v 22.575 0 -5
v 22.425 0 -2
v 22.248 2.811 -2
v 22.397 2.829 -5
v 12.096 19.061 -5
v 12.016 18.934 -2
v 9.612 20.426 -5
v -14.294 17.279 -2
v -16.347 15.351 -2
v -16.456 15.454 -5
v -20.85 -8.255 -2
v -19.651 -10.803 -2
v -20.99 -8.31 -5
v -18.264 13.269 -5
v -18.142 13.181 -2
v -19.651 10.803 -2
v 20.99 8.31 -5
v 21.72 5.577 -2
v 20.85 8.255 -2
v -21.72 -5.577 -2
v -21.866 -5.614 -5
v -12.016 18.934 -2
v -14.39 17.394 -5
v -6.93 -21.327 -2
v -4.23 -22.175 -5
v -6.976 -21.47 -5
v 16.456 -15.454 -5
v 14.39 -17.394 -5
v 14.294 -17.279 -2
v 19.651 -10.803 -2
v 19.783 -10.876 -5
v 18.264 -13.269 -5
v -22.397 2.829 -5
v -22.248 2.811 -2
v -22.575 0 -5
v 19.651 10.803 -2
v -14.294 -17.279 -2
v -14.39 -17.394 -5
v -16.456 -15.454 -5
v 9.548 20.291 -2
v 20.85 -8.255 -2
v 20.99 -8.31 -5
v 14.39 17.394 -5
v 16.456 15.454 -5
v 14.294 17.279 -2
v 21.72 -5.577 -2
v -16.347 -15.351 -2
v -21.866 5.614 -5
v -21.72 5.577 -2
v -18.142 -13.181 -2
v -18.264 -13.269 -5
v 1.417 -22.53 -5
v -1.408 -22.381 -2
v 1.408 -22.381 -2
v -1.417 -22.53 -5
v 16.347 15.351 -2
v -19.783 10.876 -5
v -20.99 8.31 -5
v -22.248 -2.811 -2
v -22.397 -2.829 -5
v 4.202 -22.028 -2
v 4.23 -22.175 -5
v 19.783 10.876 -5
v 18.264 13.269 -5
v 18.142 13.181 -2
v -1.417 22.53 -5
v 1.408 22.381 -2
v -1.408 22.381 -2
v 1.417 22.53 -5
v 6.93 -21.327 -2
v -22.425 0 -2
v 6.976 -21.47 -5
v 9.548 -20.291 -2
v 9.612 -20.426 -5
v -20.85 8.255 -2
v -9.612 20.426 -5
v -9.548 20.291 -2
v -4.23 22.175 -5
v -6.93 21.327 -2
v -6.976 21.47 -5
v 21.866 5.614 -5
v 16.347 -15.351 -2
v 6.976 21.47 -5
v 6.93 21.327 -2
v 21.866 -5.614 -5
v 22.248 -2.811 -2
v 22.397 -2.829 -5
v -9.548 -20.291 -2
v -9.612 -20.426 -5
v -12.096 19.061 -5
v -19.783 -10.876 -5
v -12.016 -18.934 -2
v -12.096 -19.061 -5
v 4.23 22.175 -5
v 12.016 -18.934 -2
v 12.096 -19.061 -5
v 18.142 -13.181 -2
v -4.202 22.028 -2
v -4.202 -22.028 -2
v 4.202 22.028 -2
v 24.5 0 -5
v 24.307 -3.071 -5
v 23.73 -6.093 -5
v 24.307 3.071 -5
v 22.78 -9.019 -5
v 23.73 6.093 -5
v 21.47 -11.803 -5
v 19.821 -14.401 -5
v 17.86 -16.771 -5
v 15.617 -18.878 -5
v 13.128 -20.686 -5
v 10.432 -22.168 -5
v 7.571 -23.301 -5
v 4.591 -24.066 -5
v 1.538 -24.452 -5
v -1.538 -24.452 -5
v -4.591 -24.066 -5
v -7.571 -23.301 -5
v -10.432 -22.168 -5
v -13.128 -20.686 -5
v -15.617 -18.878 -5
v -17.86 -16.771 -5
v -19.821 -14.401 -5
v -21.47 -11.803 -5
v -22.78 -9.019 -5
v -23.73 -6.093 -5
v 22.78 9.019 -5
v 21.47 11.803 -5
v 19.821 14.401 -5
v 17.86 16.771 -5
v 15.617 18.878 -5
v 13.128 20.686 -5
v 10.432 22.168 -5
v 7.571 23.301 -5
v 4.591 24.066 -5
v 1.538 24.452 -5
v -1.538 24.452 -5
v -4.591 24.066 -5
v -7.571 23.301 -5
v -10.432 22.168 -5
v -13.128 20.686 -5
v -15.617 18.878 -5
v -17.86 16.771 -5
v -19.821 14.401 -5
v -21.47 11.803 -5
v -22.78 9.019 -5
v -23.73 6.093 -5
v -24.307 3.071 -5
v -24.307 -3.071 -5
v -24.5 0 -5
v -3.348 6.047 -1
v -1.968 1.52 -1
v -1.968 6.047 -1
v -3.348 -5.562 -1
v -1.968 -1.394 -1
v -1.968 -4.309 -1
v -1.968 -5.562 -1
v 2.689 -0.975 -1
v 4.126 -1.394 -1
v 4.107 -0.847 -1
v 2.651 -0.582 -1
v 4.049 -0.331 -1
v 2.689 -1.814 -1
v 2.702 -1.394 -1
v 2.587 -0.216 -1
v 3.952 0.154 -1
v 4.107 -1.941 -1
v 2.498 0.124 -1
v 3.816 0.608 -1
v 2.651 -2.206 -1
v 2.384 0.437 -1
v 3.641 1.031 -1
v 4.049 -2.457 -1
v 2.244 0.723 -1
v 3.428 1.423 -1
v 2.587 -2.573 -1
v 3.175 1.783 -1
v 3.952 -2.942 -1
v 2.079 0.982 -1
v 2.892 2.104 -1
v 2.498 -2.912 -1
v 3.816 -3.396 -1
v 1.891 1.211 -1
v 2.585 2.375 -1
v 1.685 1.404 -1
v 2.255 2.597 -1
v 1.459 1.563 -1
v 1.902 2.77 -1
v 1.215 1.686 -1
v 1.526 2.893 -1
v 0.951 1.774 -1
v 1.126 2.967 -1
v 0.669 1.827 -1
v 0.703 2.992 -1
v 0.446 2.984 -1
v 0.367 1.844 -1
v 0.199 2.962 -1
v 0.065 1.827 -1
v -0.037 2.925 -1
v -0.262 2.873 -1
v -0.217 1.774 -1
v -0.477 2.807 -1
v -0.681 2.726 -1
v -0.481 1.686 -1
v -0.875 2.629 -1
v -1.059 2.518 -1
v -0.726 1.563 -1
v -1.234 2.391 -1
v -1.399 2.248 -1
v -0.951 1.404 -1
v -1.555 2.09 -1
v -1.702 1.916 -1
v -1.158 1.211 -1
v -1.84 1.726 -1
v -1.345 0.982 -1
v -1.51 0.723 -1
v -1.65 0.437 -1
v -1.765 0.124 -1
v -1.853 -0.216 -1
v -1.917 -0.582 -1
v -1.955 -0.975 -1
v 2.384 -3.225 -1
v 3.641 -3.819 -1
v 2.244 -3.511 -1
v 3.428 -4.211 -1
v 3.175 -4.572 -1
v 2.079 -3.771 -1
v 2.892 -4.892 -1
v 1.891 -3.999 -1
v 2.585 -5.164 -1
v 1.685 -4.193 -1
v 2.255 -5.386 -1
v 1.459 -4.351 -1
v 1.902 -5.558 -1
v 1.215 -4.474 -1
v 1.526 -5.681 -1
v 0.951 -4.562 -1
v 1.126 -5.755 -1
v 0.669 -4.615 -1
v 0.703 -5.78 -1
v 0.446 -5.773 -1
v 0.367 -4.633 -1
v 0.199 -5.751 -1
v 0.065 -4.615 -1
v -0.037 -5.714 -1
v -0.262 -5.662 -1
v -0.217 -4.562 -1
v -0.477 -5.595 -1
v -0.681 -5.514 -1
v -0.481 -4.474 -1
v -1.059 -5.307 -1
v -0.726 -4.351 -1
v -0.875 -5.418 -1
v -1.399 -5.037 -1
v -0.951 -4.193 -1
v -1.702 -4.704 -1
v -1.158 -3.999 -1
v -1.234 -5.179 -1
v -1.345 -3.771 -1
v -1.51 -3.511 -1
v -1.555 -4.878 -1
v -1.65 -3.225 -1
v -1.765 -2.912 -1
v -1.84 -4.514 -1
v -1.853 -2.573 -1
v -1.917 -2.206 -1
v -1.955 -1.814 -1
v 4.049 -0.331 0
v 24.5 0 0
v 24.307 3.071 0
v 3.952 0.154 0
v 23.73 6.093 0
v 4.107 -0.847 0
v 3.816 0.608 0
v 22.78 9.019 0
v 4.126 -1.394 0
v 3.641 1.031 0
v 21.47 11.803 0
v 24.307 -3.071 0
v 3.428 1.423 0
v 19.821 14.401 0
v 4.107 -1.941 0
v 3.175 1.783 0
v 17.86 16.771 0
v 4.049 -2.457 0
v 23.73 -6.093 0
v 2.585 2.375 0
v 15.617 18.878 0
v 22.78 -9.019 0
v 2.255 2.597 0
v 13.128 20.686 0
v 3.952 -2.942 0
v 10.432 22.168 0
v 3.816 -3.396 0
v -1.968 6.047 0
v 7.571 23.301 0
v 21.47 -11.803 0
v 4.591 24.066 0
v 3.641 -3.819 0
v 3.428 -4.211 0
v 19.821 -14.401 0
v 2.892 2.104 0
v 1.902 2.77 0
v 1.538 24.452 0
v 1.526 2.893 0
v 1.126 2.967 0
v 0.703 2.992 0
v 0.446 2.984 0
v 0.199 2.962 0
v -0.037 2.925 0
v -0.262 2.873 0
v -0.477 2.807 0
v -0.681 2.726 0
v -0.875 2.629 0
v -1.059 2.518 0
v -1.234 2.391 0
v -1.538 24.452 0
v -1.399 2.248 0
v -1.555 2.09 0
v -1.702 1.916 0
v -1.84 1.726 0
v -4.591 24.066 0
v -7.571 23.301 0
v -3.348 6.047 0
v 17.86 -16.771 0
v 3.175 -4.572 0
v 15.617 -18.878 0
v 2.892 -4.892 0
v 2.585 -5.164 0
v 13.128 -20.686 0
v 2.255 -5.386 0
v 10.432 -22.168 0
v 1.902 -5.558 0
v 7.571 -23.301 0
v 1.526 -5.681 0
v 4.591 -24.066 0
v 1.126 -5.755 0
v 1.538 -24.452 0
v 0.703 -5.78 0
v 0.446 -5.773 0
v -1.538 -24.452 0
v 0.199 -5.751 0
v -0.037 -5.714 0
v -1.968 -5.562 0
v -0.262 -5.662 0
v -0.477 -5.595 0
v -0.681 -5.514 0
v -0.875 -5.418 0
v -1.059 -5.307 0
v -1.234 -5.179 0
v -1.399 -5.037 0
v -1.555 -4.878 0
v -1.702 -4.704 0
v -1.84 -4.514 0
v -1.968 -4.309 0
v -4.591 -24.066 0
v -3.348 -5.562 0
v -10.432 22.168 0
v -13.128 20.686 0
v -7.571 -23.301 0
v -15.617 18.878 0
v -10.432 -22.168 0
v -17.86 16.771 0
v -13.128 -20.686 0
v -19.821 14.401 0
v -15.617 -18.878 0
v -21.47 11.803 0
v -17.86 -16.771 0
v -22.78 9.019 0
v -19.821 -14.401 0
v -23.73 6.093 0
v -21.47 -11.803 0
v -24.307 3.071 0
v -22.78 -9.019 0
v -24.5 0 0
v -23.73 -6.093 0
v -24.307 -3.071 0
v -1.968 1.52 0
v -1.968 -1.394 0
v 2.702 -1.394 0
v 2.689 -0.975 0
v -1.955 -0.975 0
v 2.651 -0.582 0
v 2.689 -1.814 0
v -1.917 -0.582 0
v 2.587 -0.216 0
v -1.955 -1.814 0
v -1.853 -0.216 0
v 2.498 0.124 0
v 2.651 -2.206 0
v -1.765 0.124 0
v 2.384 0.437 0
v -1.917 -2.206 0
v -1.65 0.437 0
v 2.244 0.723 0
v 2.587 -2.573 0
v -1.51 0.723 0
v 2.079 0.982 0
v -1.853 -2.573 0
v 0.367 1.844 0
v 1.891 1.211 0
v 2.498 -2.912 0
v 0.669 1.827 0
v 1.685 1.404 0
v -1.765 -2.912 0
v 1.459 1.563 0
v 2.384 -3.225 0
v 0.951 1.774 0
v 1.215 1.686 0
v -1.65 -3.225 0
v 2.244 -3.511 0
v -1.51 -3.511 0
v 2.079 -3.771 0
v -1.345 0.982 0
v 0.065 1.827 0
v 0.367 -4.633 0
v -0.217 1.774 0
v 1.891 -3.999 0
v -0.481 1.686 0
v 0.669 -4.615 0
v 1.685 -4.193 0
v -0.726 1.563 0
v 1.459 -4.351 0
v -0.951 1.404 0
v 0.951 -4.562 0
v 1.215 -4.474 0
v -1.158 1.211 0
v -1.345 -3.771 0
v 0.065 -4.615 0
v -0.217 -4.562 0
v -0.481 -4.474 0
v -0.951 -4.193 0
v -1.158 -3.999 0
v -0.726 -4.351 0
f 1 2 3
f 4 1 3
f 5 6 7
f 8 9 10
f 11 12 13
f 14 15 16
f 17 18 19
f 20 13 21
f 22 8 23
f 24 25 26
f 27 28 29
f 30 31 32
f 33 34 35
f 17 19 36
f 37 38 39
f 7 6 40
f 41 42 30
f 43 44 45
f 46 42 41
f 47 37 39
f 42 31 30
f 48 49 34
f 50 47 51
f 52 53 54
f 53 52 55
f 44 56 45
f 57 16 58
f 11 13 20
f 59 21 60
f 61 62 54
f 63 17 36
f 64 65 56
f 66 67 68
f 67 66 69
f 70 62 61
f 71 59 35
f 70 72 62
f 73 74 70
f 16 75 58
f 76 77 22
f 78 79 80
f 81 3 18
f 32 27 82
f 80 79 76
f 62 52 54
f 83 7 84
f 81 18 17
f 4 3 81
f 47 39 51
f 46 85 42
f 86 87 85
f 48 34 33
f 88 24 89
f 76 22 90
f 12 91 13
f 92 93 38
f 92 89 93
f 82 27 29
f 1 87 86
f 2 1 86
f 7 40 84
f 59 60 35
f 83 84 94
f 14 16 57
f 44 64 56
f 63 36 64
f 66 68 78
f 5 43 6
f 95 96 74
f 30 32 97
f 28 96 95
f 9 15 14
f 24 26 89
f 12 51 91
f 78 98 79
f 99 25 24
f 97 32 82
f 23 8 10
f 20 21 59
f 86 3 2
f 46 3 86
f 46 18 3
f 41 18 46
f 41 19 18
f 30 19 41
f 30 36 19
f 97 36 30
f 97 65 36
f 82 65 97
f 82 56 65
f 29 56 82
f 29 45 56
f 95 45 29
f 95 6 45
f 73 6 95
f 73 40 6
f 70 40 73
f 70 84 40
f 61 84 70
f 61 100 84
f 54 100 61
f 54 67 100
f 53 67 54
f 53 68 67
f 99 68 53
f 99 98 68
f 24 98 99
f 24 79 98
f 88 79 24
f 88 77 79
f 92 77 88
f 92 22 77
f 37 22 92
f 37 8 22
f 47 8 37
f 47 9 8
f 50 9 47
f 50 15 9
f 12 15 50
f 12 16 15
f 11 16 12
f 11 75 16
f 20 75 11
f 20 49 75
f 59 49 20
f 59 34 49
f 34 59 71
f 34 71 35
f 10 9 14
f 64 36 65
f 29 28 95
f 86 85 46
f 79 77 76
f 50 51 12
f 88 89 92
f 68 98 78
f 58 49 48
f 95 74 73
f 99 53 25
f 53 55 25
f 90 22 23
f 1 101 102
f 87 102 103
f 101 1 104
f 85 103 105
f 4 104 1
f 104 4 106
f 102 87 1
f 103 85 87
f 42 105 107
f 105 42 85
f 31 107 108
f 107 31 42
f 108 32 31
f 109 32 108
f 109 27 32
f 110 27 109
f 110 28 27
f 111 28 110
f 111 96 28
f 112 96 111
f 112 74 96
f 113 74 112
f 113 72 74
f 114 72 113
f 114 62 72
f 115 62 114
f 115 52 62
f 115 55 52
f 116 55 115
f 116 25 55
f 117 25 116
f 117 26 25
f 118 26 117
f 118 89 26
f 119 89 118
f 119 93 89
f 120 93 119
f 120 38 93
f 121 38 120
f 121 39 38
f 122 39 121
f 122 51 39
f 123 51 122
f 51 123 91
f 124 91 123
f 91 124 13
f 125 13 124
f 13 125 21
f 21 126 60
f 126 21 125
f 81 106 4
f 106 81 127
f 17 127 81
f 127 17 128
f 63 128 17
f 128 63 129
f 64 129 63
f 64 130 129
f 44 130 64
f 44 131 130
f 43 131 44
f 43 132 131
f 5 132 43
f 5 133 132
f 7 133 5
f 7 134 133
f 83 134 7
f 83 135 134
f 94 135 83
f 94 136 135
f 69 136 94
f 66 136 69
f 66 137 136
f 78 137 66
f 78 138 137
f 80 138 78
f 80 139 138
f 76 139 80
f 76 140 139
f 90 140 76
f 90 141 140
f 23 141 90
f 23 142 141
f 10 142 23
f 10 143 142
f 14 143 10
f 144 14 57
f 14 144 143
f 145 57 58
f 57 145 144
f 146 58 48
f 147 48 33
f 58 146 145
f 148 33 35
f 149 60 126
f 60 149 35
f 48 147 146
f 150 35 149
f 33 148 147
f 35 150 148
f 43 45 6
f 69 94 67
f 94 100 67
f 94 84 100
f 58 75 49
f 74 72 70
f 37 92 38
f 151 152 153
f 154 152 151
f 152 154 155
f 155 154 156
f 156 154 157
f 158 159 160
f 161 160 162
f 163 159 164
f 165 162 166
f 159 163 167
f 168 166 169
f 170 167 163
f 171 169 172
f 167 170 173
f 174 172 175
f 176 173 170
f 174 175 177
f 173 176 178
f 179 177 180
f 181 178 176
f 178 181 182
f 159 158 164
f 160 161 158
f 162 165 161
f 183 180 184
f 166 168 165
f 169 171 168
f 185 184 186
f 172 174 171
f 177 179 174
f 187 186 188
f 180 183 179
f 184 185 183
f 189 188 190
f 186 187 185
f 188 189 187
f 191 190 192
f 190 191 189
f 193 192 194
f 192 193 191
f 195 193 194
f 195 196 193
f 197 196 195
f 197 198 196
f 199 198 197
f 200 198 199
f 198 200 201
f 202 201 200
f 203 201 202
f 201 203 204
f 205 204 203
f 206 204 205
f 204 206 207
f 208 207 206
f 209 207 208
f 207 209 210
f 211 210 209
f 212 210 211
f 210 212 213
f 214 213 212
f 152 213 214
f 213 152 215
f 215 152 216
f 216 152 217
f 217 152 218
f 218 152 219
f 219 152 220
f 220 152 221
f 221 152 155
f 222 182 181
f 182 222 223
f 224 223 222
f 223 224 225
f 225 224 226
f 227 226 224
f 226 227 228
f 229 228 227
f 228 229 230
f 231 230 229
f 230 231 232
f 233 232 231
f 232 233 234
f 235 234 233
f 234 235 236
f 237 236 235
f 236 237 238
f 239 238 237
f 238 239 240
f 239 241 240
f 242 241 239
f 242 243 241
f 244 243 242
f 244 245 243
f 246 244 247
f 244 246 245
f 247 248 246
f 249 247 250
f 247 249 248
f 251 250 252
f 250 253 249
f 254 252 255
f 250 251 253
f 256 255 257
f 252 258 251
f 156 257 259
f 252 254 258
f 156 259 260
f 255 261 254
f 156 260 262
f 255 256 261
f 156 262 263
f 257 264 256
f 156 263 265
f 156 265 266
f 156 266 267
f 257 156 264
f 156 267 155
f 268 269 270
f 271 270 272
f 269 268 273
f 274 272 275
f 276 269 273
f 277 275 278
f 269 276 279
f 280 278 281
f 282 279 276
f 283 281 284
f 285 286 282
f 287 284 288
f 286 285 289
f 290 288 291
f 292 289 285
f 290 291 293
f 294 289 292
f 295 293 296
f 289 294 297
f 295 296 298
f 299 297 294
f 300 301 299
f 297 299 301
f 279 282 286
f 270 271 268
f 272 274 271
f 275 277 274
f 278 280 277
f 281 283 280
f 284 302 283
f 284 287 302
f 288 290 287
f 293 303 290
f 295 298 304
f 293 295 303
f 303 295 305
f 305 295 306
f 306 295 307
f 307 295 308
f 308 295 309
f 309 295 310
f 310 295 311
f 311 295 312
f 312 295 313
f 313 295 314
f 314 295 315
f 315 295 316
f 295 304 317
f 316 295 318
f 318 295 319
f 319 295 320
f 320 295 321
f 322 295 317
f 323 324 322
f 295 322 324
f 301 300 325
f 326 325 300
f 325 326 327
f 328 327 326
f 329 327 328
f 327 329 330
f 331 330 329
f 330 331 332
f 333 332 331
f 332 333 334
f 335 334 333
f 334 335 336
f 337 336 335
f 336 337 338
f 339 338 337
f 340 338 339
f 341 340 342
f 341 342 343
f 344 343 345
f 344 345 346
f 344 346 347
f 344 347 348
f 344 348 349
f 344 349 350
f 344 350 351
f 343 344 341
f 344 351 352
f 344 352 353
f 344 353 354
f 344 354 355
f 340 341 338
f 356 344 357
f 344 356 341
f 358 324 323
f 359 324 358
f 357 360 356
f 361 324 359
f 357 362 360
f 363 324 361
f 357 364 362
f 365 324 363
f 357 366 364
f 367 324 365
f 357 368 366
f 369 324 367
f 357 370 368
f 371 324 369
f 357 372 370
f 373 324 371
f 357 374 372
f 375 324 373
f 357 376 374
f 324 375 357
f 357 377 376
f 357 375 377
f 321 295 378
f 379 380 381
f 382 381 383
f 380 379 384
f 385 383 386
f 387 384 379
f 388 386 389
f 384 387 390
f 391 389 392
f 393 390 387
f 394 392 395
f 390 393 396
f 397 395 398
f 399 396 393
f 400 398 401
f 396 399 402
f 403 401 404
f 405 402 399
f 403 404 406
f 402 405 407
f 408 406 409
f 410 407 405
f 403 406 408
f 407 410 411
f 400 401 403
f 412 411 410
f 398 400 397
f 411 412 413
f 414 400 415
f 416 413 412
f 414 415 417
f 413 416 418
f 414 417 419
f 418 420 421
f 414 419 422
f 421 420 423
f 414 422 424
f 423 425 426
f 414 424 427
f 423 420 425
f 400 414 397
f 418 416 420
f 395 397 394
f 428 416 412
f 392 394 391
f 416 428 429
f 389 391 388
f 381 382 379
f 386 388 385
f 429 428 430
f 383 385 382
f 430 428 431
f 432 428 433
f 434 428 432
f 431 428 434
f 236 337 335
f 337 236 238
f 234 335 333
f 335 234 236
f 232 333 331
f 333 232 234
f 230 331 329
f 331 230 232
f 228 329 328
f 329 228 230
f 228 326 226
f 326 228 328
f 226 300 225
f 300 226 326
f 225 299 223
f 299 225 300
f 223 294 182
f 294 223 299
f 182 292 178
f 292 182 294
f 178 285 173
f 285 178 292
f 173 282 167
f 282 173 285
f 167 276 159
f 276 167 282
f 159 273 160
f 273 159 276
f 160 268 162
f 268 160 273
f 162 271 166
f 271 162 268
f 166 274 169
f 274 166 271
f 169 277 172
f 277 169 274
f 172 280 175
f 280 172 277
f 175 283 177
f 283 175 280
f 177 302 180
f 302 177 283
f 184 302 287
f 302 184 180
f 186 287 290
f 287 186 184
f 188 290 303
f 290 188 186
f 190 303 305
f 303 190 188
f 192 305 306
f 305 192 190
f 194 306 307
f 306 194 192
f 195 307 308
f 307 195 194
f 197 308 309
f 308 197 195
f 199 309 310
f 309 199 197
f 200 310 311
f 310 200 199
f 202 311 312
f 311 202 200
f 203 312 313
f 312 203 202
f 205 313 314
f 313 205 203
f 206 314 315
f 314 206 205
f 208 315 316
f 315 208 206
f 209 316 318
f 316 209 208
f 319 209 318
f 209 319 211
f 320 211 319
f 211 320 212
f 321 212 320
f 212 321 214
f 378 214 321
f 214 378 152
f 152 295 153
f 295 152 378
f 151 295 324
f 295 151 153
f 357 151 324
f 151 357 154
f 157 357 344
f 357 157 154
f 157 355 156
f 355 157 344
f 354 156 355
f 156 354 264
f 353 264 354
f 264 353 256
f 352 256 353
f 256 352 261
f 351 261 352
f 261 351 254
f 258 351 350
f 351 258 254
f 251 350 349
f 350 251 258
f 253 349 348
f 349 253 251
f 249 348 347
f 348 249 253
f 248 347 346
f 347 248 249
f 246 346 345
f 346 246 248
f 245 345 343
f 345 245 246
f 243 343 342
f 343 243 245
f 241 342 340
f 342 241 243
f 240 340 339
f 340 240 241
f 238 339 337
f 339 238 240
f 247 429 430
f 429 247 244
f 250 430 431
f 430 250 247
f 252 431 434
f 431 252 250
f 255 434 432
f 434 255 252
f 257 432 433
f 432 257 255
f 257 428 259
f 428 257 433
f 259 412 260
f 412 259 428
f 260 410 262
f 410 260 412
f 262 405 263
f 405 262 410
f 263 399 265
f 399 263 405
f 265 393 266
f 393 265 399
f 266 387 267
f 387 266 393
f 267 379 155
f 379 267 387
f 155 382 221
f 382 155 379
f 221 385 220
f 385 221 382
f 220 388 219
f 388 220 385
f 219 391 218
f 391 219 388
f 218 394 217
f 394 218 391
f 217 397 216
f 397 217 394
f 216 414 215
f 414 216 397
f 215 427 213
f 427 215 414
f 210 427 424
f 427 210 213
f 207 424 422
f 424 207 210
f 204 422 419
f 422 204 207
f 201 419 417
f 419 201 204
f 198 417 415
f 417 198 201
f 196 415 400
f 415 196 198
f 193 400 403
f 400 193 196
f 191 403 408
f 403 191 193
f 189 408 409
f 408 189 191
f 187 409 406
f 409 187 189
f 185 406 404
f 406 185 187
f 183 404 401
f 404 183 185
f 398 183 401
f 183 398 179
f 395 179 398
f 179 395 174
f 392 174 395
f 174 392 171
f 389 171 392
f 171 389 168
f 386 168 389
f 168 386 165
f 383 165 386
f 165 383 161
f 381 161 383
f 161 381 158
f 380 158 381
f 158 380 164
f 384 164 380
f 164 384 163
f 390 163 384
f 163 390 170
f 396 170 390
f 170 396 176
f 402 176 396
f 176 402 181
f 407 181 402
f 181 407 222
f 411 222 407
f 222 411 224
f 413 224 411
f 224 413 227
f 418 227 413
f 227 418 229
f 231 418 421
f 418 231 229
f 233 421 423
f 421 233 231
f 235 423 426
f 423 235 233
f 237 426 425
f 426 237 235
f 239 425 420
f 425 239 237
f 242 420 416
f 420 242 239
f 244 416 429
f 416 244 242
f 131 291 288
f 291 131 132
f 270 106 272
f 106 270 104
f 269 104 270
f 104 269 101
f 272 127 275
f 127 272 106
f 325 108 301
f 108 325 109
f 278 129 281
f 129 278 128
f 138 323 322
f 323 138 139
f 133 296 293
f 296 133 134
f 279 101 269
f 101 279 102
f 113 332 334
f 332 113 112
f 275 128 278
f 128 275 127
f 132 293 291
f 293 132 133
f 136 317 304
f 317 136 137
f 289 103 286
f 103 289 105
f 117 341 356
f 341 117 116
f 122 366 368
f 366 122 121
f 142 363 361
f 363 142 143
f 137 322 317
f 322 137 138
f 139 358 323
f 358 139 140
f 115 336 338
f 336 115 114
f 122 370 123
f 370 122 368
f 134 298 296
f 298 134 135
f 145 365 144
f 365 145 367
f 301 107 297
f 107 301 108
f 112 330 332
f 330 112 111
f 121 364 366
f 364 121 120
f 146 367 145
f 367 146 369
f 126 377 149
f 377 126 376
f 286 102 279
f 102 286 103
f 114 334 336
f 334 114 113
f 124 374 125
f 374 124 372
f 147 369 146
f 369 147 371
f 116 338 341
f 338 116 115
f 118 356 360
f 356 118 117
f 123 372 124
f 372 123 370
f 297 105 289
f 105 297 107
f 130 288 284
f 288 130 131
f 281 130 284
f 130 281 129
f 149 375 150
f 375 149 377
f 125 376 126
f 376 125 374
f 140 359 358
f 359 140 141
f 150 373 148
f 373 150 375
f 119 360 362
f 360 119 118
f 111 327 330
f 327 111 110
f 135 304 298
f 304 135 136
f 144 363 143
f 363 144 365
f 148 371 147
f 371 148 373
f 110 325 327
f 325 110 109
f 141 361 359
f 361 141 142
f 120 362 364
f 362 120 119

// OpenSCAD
$fn = 50;


difference() {
	union() {
		translate(v = [0, 0, -5.0000000000]) {
			cylinder(h = 5, r = 24.5000000000);
		}
	}
	union() {
		#translate(v = [0, 0, -5.0000000000]) {
			cylinder(h = 3, r1 = 22.5750000000, r2 = 22.4250000000);
		}
		translate(v = [0, 0, -1]) {
			linear_extrude(height = 1) {
				text(font = "Webdings", halign = "center", size = 11, text = "b", valign = "center");
			}
		}
	}
}
